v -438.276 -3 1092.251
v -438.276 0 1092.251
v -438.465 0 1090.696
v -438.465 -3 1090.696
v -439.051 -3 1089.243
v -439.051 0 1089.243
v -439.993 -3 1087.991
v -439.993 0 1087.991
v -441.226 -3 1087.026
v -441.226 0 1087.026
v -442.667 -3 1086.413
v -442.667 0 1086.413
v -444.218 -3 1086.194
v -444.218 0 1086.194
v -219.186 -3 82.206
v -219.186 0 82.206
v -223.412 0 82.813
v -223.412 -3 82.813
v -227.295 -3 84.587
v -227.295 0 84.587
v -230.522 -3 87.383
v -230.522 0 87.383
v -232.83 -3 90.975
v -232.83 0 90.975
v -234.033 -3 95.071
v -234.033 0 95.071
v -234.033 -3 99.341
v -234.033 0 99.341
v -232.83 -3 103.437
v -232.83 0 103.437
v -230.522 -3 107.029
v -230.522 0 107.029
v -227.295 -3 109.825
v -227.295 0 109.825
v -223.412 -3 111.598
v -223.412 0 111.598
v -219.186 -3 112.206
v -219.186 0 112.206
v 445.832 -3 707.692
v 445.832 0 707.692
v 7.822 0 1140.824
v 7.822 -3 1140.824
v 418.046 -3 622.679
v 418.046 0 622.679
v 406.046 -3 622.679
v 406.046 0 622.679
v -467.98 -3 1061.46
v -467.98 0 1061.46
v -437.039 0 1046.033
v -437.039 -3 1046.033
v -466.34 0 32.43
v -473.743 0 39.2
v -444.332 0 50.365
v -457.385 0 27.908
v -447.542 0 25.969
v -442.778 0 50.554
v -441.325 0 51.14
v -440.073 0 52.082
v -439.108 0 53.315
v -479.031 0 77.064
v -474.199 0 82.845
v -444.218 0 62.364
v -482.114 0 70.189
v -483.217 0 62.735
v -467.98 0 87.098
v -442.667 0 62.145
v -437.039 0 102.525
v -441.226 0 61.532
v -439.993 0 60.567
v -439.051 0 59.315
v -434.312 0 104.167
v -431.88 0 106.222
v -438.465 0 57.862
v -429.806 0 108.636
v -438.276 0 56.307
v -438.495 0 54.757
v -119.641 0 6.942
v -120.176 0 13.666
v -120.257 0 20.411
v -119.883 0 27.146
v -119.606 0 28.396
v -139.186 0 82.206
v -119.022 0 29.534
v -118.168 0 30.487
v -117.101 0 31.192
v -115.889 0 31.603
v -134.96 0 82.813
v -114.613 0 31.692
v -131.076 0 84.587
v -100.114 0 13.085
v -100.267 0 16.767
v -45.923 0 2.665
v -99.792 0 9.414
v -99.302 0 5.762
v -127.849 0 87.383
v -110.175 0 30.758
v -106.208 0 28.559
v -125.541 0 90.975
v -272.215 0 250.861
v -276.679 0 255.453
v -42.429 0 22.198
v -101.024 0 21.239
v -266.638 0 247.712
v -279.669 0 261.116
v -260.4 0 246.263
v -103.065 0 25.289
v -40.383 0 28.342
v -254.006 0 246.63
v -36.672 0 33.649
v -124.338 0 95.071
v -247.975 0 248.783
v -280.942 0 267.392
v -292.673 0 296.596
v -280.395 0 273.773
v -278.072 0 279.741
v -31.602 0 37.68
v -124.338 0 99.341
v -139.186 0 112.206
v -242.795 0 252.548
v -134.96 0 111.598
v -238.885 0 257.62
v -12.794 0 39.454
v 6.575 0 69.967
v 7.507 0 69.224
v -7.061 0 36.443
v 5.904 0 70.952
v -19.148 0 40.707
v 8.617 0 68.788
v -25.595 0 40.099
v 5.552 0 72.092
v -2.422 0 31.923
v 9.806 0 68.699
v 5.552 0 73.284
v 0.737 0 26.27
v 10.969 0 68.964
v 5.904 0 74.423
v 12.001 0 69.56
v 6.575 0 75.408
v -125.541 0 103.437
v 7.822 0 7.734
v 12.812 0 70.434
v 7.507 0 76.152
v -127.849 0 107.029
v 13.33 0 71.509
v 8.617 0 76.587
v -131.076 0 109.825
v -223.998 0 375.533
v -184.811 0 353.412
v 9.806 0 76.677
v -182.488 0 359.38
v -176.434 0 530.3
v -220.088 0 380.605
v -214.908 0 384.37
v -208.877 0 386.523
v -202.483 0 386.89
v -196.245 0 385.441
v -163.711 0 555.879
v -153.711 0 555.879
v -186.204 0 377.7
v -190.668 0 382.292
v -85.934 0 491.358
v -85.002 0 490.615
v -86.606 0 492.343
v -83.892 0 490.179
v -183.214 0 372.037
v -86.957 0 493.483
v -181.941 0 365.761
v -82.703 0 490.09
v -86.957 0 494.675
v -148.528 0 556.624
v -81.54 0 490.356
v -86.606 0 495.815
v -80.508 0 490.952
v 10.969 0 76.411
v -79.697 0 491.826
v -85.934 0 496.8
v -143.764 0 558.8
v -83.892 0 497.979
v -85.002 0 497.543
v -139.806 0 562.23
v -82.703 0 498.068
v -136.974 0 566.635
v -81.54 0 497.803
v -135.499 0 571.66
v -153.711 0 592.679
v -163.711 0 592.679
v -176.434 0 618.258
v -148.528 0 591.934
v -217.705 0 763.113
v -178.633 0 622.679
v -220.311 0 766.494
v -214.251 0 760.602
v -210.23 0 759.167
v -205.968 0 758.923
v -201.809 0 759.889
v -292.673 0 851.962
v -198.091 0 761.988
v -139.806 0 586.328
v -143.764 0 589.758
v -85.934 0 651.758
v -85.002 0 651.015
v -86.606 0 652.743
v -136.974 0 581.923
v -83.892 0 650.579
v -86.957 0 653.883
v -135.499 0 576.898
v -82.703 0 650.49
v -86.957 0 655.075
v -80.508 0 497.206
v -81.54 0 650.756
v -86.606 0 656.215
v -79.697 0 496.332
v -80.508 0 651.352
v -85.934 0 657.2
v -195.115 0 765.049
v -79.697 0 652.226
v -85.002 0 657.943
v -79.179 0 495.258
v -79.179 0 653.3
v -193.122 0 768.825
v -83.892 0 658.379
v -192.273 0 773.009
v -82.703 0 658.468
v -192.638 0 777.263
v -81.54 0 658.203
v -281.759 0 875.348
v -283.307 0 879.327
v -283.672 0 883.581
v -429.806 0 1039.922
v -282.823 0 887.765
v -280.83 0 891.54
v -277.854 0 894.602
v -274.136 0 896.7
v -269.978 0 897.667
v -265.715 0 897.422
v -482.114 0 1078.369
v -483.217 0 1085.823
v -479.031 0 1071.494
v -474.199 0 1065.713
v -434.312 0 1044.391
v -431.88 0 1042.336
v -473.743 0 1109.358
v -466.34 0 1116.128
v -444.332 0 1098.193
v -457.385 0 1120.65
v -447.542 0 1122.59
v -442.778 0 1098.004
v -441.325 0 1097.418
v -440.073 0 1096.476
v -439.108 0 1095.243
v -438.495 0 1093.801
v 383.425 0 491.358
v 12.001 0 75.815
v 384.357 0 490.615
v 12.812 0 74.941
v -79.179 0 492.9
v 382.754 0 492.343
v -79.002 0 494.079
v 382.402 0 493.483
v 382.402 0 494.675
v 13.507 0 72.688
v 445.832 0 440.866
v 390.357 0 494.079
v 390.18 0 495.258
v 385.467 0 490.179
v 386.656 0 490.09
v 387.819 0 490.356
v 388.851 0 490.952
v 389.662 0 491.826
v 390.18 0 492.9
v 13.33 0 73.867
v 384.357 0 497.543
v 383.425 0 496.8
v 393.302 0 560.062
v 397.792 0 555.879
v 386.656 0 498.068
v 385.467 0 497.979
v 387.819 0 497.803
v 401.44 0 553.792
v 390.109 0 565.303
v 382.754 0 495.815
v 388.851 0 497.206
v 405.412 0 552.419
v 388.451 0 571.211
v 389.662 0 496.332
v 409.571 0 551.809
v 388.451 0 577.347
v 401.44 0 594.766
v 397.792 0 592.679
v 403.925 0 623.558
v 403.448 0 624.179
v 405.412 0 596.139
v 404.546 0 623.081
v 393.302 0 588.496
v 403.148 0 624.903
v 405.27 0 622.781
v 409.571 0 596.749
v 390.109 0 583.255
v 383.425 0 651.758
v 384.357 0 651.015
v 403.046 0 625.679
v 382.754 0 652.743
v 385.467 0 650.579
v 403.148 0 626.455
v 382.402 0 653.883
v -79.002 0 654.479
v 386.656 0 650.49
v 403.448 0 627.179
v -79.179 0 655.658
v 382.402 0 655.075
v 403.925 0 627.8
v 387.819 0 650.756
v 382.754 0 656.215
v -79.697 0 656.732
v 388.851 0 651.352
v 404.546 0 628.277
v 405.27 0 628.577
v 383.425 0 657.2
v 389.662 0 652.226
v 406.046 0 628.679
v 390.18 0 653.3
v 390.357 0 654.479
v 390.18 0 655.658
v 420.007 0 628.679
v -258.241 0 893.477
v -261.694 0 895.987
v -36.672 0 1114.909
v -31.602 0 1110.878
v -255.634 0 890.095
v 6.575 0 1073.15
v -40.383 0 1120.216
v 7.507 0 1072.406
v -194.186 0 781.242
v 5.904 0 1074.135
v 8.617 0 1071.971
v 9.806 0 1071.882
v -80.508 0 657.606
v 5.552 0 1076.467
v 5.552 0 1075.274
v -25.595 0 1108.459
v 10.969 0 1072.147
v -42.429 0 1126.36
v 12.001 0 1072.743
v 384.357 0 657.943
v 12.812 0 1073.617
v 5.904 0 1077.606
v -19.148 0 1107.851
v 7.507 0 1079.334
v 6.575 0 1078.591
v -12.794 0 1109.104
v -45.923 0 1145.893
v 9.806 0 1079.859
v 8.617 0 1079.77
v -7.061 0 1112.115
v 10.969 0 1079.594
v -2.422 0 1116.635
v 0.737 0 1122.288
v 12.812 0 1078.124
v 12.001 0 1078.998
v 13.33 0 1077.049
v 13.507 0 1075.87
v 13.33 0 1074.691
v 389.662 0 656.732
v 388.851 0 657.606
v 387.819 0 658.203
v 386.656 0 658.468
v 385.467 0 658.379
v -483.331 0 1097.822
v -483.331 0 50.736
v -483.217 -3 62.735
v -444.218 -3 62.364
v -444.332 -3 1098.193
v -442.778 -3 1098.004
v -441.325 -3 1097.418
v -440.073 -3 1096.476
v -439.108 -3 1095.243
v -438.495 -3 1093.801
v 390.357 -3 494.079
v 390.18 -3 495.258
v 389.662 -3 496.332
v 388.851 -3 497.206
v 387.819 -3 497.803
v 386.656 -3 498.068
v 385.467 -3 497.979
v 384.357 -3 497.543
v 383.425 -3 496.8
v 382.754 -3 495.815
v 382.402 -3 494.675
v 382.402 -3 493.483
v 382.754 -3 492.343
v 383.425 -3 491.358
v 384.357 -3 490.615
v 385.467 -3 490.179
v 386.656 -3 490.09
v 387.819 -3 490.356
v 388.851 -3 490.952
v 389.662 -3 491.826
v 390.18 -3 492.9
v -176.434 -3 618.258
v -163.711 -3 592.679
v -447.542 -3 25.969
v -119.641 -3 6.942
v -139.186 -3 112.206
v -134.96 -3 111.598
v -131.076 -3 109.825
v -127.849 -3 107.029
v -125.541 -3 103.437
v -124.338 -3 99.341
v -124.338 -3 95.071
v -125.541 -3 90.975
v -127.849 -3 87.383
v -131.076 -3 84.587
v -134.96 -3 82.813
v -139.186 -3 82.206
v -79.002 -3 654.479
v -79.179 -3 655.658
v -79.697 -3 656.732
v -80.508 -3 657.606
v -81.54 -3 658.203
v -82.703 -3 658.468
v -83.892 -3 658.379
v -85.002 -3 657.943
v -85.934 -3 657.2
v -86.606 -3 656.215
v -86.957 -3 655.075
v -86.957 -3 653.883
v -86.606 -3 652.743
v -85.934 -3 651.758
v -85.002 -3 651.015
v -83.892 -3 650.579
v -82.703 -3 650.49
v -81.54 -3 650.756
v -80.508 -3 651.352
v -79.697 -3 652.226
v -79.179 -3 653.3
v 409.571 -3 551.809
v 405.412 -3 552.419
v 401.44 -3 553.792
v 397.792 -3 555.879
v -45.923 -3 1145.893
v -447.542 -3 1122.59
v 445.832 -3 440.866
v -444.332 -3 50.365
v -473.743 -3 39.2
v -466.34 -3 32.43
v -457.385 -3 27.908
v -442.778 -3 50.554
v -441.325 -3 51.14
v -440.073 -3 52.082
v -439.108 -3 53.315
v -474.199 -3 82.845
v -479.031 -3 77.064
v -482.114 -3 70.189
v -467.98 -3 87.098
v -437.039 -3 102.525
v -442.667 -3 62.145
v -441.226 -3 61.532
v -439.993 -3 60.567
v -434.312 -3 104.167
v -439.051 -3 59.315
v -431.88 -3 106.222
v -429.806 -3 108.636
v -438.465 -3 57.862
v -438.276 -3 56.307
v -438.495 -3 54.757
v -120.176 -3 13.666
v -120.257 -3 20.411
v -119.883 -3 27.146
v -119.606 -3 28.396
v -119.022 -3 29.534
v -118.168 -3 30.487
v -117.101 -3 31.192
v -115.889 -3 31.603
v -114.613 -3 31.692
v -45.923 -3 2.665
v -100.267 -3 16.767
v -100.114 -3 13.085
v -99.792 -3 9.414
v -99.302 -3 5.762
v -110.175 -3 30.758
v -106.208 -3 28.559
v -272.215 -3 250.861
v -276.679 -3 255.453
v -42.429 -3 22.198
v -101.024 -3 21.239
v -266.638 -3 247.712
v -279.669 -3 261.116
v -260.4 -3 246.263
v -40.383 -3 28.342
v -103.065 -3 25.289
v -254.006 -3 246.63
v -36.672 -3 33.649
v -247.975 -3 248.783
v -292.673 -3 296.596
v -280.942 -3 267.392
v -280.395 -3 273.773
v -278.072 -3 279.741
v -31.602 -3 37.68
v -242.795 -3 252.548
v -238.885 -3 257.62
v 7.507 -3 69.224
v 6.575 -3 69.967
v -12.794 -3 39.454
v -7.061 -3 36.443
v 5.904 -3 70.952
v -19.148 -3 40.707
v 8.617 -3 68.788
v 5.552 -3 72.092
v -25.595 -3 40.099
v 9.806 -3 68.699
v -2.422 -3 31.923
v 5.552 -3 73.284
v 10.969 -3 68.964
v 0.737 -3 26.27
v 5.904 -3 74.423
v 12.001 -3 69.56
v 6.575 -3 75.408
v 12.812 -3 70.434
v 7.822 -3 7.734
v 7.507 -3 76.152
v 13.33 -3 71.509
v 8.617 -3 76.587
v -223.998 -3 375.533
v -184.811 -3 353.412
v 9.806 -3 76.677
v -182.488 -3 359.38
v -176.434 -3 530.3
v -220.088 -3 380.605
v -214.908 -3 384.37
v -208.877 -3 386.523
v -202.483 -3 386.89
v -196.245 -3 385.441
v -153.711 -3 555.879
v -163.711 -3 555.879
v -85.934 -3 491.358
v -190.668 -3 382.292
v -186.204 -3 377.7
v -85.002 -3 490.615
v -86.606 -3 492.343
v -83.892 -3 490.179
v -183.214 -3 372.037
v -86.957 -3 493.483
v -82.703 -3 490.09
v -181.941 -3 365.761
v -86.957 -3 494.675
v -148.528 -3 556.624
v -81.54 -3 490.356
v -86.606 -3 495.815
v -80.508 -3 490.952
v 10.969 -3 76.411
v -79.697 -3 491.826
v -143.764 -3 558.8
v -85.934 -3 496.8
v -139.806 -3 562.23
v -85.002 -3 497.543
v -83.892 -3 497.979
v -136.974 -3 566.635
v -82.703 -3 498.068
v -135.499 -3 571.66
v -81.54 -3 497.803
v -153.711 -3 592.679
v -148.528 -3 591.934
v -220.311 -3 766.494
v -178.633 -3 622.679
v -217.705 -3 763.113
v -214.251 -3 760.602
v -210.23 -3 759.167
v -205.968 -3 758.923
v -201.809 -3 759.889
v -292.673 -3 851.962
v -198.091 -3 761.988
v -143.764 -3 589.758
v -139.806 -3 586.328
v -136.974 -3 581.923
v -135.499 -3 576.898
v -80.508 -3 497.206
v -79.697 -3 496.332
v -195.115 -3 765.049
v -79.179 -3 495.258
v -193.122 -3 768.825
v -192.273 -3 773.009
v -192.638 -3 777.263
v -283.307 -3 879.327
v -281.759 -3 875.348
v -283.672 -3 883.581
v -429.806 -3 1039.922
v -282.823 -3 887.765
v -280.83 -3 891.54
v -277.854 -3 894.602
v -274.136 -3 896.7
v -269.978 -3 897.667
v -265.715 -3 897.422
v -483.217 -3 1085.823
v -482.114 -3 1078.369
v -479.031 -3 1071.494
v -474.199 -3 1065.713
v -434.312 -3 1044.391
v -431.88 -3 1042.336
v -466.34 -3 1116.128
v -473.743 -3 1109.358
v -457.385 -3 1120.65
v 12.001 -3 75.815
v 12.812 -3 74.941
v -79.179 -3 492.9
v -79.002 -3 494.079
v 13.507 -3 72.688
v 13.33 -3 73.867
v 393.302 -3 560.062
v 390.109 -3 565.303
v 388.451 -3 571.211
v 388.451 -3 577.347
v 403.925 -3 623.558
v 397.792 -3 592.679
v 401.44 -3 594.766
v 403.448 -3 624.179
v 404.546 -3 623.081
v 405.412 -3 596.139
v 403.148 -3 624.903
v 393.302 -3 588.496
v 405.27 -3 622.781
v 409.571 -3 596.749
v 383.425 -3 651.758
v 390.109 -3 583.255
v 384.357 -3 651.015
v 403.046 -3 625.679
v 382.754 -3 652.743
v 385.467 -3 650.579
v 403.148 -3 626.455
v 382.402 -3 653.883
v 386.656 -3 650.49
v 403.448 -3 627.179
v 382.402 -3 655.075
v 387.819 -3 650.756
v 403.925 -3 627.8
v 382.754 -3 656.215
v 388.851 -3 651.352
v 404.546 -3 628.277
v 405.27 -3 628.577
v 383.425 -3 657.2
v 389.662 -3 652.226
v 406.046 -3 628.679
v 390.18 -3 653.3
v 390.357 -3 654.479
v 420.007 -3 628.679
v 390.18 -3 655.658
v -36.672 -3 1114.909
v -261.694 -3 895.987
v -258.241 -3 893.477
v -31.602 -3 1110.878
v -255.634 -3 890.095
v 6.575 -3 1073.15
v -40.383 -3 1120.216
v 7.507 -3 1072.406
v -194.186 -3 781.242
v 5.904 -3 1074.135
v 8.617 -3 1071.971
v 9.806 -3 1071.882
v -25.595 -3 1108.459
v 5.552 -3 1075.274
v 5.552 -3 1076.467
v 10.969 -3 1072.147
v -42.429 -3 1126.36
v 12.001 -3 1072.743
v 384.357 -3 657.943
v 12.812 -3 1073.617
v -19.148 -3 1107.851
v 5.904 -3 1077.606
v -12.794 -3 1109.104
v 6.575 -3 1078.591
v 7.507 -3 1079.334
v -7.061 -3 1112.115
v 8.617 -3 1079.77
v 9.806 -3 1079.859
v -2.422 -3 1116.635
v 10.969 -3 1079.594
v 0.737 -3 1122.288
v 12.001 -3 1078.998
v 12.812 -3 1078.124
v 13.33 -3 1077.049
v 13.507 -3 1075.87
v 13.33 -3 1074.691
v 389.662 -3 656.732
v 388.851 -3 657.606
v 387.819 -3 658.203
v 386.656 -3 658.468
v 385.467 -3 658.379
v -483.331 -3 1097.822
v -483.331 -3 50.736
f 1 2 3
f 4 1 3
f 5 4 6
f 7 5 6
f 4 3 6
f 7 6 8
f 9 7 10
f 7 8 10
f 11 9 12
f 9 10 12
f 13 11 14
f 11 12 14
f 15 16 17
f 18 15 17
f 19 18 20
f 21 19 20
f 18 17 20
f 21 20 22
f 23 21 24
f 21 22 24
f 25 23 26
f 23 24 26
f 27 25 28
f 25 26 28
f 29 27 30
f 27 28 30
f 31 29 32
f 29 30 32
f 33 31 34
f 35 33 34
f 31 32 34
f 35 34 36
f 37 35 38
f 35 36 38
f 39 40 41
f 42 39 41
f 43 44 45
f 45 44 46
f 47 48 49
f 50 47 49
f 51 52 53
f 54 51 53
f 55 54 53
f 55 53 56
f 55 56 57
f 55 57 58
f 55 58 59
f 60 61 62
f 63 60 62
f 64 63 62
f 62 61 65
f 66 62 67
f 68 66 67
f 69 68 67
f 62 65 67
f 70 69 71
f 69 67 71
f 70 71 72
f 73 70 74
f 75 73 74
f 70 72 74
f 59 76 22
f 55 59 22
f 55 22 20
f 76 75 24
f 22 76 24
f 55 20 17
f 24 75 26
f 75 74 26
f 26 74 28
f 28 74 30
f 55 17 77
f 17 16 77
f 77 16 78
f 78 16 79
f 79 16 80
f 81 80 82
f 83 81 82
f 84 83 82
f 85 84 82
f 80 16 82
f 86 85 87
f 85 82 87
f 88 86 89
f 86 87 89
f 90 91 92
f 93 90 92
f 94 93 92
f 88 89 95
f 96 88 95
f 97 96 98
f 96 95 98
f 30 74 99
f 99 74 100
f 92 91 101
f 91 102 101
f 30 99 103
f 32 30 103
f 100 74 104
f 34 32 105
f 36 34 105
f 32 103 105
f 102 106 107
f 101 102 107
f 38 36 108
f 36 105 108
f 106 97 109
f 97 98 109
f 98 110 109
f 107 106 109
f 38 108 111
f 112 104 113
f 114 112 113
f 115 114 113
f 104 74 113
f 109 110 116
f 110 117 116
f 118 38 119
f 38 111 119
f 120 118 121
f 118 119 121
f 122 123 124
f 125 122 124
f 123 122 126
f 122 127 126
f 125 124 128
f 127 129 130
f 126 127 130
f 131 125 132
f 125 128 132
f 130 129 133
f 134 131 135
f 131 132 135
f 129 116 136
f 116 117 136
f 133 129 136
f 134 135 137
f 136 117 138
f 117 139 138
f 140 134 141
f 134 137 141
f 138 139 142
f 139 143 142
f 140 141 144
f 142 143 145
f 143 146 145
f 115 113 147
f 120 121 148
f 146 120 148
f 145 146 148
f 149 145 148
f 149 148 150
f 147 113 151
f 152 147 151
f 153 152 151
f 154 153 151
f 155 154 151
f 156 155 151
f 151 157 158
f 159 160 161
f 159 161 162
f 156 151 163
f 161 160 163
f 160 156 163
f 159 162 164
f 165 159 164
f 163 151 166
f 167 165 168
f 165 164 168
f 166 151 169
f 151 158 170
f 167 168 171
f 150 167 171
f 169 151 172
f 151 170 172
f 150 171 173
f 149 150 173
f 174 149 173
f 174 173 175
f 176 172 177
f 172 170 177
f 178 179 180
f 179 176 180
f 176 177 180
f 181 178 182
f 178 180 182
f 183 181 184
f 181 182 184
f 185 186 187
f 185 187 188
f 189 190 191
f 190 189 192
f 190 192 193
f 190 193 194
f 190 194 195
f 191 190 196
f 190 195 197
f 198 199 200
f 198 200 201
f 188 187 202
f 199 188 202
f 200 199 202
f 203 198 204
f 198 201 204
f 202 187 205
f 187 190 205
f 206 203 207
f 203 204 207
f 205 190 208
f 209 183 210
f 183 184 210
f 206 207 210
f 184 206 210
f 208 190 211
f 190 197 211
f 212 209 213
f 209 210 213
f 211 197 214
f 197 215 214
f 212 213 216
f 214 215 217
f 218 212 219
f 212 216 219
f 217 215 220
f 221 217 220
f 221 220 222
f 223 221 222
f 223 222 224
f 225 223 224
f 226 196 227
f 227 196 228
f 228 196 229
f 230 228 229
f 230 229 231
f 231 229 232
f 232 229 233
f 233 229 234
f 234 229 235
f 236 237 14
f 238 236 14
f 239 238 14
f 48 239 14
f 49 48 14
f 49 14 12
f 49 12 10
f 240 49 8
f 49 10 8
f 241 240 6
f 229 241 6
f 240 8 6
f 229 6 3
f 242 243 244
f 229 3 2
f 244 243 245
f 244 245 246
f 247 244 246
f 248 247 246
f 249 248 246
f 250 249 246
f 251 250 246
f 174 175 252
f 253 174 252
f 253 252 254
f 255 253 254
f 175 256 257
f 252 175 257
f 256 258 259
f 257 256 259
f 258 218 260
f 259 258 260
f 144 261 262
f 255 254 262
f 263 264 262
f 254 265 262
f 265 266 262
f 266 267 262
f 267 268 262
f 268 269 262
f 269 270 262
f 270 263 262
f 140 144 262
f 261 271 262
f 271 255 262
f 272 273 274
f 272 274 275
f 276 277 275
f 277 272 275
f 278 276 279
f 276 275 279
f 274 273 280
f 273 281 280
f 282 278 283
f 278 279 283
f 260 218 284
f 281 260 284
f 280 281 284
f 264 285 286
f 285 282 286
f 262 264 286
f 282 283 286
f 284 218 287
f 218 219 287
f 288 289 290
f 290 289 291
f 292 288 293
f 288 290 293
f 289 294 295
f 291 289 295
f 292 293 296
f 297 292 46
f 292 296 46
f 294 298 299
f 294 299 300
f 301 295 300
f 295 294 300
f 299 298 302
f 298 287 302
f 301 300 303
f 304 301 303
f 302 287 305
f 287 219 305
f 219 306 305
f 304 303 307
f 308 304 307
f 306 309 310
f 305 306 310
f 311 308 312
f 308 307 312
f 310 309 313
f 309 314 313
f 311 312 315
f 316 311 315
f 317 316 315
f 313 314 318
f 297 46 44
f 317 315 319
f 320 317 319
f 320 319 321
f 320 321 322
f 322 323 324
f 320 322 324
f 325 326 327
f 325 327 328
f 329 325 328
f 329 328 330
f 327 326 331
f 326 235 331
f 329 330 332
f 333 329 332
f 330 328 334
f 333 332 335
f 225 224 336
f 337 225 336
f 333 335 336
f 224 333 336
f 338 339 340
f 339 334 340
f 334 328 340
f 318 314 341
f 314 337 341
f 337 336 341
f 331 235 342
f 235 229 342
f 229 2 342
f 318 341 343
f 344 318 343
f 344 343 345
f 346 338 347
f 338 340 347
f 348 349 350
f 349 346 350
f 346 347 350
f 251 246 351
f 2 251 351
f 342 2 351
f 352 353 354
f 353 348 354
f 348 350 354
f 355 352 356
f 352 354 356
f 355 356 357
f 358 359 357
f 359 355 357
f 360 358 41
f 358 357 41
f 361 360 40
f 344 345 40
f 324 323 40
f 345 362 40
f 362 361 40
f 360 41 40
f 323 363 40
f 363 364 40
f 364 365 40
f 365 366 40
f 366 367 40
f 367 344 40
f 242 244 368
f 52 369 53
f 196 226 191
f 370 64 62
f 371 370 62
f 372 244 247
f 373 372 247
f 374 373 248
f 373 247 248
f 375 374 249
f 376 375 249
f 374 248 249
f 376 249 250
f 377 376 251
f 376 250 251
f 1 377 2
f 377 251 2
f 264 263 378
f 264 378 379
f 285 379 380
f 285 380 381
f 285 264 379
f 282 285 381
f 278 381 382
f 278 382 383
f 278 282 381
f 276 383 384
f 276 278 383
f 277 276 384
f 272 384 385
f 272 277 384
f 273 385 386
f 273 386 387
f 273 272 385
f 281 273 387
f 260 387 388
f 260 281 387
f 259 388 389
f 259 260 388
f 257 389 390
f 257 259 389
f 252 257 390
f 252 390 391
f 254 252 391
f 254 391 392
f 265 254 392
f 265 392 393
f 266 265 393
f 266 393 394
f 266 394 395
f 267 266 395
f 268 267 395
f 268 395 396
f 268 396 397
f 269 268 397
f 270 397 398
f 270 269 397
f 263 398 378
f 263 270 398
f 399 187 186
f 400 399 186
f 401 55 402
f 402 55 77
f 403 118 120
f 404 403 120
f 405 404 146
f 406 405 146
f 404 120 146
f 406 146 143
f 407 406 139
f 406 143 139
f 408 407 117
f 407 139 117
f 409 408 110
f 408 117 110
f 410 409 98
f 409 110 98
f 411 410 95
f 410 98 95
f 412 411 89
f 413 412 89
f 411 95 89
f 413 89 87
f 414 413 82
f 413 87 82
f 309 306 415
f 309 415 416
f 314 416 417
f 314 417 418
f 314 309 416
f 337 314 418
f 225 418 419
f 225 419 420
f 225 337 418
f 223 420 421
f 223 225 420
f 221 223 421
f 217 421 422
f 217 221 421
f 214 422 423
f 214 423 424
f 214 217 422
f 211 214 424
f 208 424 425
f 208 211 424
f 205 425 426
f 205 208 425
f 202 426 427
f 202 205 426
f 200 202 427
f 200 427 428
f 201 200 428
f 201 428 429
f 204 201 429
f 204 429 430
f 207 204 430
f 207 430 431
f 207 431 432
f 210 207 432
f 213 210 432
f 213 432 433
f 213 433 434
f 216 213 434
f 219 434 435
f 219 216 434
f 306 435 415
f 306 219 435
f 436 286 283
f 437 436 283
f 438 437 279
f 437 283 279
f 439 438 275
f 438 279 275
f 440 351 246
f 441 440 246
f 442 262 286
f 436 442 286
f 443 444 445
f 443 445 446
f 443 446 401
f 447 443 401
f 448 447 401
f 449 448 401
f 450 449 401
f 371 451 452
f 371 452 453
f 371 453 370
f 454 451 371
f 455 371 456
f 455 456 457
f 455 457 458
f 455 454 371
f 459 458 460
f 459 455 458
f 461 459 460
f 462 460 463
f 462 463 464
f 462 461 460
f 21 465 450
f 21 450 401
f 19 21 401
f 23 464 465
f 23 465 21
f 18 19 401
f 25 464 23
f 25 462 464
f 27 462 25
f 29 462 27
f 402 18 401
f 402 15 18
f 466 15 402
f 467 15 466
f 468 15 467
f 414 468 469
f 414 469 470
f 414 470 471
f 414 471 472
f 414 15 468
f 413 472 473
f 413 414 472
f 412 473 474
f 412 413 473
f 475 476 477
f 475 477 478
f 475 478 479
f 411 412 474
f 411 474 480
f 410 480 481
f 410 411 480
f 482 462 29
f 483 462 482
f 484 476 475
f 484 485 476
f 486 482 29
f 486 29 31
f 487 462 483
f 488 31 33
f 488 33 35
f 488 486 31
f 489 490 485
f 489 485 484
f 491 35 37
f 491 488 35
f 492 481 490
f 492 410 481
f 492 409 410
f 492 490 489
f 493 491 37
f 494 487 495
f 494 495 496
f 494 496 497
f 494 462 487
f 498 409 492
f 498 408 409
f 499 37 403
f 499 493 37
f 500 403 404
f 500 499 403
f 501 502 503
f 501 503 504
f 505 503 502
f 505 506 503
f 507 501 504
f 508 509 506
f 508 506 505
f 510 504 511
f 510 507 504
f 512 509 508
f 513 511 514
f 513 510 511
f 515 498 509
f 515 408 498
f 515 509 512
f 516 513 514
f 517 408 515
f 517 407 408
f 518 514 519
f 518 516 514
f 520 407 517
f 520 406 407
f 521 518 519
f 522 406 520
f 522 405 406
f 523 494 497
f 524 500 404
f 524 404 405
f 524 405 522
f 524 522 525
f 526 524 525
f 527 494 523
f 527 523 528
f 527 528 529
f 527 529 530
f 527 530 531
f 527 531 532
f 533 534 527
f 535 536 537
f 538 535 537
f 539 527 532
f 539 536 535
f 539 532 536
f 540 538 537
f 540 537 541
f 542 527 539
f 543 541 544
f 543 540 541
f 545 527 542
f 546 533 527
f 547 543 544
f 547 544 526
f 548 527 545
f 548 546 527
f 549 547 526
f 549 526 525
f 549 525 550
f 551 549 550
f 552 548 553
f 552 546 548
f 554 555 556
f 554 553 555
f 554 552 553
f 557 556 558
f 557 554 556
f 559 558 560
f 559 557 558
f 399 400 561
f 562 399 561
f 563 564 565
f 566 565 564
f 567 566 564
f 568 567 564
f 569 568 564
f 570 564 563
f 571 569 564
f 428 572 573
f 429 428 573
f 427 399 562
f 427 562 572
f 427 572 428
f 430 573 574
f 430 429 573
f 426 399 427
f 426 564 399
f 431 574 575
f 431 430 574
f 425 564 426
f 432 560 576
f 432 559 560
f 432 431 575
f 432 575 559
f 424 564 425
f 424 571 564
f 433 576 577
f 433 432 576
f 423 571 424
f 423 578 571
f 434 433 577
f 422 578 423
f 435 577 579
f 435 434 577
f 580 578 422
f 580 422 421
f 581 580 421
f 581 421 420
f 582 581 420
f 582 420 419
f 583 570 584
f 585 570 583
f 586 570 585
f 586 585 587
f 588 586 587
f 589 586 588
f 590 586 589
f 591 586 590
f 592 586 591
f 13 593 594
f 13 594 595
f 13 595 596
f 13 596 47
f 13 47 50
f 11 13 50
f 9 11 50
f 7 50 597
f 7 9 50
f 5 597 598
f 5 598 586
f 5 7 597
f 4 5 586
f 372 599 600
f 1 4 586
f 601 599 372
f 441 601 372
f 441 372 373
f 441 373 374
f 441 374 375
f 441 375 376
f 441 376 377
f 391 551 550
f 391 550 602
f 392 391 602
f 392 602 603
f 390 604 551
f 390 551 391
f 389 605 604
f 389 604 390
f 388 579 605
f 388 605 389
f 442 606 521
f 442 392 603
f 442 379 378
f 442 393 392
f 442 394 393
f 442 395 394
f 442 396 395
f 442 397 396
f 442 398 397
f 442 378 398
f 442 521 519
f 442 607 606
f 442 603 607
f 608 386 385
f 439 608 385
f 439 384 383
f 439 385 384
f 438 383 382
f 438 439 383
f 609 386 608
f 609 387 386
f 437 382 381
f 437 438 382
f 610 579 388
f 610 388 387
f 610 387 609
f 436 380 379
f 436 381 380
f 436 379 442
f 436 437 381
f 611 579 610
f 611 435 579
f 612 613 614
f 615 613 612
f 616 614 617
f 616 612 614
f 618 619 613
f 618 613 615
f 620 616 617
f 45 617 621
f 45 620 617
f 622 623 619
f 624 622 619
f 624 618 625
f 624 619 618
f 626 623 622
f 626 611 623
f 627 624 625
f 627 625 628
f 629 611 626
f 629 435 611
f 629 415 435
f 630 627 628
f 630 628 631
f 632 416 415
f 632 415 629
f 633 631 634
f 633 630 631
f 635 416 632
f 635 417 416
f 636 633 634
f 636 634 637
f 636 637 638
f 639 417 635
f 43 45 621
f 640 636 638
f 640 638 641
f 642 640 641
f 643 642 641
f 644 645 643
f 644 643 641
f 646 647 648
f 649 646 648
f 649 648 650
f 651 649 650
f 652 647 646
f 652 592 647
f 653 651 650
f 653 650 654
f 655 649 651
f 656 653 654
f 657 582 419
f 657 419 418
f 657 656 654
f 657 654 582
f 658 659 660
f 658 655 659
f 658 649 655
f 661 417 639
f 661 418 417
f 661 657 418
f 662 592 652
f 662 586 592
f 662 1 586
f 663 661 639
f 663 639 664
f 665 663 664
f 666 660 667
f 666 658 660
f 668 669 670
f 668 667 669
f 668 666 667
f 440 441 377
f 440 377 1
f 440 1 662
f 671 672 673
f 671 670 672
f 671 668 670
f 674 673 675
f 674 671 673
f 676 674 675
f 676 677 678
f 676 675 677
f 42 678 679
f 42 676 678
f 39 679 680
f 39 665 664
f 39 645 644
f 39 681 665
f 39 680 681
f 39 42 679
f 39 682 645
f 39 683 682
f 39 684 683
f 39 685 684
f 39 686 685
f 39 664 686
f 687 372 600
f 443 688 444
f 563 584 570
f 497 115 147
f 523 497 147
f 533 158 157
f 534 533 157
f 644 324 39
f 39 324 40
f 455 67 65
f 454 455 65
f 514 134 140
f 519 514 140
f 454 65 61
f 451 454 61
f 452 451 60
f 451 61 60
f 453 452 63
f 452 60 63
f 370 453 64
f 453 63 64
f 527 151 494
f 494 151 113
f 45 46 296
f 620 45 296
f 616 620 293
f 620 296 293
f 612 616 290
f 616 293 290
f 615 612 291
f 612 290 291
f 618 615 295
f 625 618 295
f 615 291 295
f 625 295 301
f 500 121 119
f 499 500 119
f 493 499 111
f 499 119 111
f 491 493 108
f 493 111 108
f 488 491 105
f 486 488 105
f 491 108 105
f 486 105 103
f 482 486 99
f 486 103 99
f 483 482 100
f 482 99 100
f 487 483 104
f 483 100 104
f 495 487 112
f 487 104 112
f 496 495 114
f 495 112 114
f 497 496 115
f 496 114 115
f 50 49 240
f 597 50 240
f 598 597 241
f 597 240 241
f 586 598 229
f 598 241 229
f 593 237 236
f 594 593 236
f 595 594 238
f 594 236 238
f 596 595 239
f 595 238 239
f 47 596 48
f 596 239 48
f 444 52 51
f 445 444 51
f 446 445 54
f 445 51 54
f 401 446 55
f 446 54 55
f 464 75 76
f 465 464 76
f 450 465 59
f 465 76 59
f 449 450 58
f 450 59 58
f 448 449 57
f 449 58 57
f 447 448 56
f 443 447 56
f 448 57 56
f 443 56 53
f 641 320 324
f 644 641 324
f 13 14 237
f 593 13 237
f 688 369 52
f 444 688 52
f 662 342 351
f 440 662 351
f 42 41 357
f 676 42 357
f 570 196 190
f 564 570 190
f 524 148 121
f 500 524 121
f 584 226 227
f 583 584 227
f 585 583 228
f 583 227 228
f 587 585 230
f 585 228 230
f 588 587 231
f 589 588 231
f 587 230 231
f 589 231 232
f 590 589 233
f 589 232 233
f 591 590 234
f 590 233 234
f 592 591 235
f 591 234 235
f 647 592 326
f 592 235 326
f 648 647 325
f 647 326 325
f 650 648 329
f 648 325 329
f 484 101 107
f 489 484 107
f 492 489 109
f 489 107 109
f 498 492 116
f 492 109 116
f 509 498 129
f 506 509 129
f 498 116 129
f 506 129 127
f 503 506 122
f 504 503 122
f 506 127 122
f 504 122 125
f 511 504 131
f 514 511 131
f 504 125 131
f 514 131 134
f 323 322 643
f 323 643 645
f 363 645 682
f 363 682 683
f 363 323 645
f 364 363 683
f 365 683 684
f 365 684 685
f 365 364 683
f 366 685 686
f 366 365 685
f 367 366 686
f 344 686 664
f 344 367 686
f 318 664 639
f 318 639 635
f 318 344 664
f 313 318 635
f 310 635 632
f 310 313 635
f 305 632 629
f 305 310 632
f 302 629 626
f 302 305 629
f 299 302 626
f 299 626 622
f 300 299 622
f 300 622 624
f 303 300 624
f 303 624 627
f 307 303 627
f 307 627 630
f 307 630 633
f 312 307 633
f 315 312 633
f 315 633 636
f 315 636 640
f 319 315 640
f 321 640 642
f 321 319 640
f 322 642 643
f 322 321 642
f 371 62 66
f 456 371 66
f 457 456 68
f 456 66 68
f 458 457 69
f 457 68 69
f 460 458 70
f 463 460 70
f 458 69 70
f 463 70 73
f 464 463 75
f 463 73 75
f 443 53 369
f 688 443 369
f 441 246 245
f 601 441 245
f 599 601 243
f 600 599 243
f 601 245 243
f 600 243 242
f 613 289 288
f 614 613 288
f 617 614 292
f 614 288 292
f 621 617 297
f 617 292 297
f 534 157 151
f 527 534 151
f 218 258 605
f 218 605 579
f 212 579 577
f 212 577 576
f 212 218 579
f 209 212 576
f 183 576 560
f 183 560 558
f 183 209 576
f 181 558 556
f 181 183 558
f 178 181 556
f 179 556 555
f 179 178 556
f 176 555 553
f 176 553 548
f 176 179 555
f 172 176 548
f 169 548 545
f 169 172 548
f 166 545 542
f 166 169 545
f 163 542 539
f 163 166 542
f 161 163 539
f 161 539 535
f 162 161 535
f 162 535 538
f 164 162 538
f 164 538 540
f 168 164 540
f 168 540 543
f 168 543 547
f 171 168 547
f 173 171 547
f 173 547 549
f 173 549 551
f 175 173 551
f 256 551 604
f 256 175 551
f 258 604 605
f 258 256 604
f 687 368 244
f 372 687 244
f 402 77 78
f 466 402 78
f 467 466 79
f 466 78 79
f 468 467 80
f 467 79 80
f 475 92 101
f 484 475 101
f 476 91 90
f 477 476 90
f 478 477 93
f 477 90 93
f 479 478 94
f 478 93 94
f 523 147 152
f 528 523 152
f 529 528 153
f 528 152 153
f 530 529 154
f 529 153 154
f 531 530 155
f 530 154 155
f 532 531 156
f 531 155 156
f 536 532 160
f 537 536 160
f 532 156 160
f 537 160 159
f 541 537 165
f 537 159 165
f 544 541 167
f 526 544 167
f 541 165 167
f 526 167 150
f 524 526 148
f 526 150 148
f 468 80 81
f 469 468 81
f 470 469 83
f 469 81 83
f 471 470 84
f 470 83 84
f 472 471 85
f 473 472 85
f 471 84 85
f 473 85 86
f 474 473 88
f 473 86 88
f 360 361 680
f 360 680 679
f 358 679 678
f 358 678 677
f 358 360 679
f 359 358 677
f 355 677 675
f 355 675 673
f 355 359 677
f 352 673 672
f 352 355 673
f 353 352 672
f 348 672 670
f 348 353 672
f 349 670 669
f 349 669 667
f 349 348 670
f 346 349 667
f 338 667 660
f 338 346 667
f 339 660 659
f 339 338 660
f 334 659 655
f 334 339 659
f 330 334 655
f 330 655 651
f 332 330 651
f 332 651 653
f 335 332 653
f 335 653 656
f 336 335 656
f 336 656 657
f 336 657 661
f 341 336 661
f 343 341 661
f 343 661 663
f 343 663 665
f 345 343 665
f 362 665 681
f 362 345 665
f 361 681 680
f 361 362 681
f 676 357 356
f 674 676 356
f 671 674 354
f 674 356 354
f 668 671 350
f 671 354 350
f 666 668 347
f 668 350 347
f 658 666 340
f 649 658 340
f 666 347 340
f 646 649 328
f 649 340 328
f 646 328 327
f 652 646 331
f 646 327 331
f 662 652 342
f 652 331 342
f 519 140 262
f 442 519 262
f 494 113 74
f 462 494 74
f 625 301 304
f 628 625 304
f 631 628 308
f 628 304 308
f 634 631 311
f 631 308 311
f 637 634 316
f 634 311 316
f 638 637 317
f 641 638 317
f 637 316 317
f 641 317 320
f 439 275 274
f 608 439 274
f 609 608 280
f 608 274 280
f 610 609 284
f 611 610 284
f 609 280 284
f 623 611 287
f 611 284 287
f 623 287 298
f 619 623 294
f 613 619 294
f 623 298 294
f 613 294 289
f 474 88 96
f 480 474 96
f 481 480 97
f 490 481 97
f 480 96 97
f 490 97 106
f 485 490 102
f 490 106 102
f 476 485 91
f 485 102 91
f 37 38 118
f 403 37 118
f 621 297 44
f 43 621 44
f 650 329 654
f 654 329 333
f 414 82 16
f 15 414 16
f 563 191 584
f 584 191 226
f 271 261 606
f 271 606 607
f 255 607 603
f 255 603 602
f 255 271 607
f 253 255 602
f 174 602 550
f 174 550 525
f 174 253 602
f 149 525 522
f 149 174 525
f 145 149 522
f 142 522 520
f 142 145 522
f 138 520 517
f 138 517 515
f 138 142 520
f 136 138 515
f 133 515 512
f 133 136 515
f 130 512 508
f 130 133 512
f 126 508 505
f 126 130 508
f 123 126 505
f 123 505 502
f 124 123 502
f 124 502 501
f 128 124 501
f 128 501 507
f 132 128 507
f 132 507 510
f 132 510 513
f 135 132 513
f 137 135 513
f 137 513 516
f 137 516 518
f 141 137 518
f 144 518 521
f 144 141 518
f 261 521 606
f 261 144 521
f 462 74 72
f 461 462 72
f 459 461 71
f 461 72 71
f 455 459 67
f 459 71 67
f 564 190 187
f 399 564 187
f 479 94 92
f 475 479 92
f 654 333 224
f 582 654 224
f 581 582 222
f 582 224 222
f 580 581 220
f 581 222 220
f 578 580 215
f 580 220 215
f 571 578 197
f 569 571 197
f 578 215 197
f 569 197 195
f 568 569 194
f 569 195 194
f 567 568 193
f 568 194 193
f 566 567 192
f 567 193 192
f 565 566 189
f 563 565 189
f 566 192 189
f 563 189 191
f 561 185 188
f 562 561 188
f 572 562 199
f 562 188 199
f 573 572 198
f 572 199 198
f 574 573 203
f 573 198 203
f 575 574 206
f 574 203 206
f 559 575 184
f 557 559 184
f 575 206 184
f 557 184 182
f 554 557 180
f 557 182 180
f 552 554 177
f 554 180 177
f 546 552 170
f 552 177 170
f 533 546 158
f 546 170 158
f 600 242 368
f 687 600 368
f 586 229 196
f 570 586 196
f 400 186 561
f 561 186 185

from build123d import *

# Parameters (mm, degrees)
F0_R     = 4
F1_DEPTH = 3


with BuildPart() as f1:
    # F0 (on Front) → F1 (new body)
    with BuildSketch(Plane.XZ):
        with BuildLine():
            ThreePointArc((-42.428788, 22.197763), (-22.393428, 40.636528), (0.736568, 26.269656))
            Line((0.736568, 26.269656), (7.82161, 7.734496))
            Line((7.82161, 7.734496), (445.831745, 440.866256))
            Line((445.831745, 440.866256), (409.571118, 551.809463))
            ThreePointArc((409.571118, 551.809463), (403.393924, 553.012383), (397.791506, 555.879027))
            Line((397.791506, 555.879027), (-153.711431, 555.879027))
            Line((-153.711431, 555.879027), (-163.711431, 555.879027))
            Line((-163.711431, 555.879027), (-176.433934, 530.299822))
            Line((-176.433934, 530.299822), (-292.672837, 296.595913))
            Line((-292.672837, 296.595913), (-429.805557, 108.635613))
            ThreePointArc((-429.805557, 108.635613), (-433.055197, 105.145969), (-437.038546, 102.524765))
            Line((-437.038546, 102.524765), (-467.979575, 87.098137))
            ThreePointArc((-467.979575, 87.098137), (-479.031049, 77.063624), (-483.216559, 62.73505))
            Line((-483.216559, 62.73505), (-444.218322, 62.364245))
            ThreePointArc((-444.218322, 62.364245), (-439.992581, 60.566627), (-438.27564, 56.307469))
            ThreePointArc((-438.27564, 56.307469), (-440.073258, 52.081729), (-444.332415, 50.364787))
            Line((-444.332415, 50.364787), (-483.330653, 50.735592))
            Line((-483.330653, 50.735592), (-473.742625, 39.200006))
            ThreePointArc((-473.742625, 39.200006), (-462.016917, 29.862605), (-447.542263, 25.968544))
            Line((-447.542263, 25.968544), (-119.640526, 6.942116))
            ThreePointArc((-119.640526, 6.942116), (-120.273154, 17.038104), (-119.882564, 27.146349))
            ThreePointArc((-119.882564, 27.146349), (-118.168468, 30.486744), (-114.612815, 31.692435))
            Line((-114.612815, 31.692435), (-99.287074, 30.803162))
            ThreePointArc((-99.287074, 30.803162), (-100.086144, 23.806602), (-100.266839, 16.766878))
            ThreePointArc((-100.266839, 16.766878), (-99.974524, 11.247746), (-99.30184, 5.761968))
            Line((-99.30184, 5.761968), (-45.922757, 2.664658))
            Line((-45.922757, 2.664658), (-42.428788, 22.197763))
        make_face()
        with BuildLine():
            ThreePointArc((-219.185589, 82.205842), (-234.185589, 97.205842), (-219.185589, 112.205842))
            Line((-219.185589, 112.205842), (-139.185589, 112.205842))
            ThreePointArc((-139.185589, 112.205842), (-124.185589, 97.205842), (-139.185589, 82.205842))
            Line((-139.185589, 82.205842), (-219.185589, 82.205842))
        make_face(mode=Mode.SUBTRACT)
        with BuildLine():
            ThreePointArc((-238.884885, 257.620199), (-269.539195, 249.087128), (-278.072266, 279.741438))
            Line((-278.072266, 279.741438), (-223.998126, 375.532812))
            ThreePointArc((-223.998126, 375.532812), (-193.343817, 384.065883), (-184.810746, 353.411573))
            Line((-184.810746, 353.411573), (-238.884885, 257.620199))
        make_face(mode=Mode.SUBTRACT)
        with Locations((-83.001788, 494.079027)):
            Circle(F0_R, mode=Mode.SUBTRACT)
        with Locations((9.507399, 72.687717)):
            Circle(F0_R, mode=Mode.SUBTRACT)
        with Locations((386.357424, 494.079027)):
            Circle(F0_R, mode=Mode.SUBTRACT)
        with BuildLine():
            ThreePointArc((-114.612815, 31.692435), (-104.514185, 27.041692), (-100.266839, 16.766878))
            ThreePointArc((-100.266839, 16.766878), (-100.086144, 23.806602), (-99.287074, 30.803162))
            Line((-99.287074, 30.803162), (-114.612815, 31.692435))
        make_face()
        with BuildLine():
            Line((-153.711431, 555.879027), (397.791506, 555.879027))
            ThreePointArc((397.791506, 555.879027), (388.241023, 574.279027), (397.791506, 592.679027))
            Line((397.791506, 592.679027), (-153.711431, 592.679027))
            ThreePointArc((-153.711431, 592.679027), (-135.311431, 574.279027), (-153.711431, 555.879027))
        make_face()
        with BuildLine():
            Line((-153.711431, 592.679027), (397.791506, 592.679027))
            ThreePointArc((397.791506, 592.679027), (403.393924, 595.545671), (409.571118, 596.748591))
            Line((409.571118, 596.748591), (418.046209, 622.679027))
            Line((418.046209, 622.679027), (406.046209, 622.679027))
            ThreePointArc((406.046209, 622.679027), (403.924889, 623.557707), (403.046209, 625.679027))
            ThreePointArc((403.046209, 625.679027), (403.924889, 627.800347), (406.046209, 628.679027))
            Line((406.046209, 628.679027), (420.007247, 628.679027))
            Line((420.007247, 628.679027), (445.831745, 707.691799))
            Line((445.831745, 707.691799), (7.82161, 1140.823559))
            Line((7.82161, 1140.823559), (0.736568, 1122.288398))
            ThreePointArc((0.736568, 1122.288398), (-22.393428, 1107.921526), (-42.428788, 1126.360291))
            Line((-42.428788, 1126.360291), (-45.922757, 1145.893396))
            Line((-45.922757, 1145.893396), (-447.542263, 1122.58951))
            ThreePointArc((-447.542263, 1122.58951), (-462.016917, 1118.695449), (-473.742625, 1109.358048))
            Line((-473.742625, 1109.358048), (-483.330653, 1097.822462))
            Line((-483.330653, 1097.822462), (-444.332415, 1098.193267))
            ThreePointArc((-444.332415, 1098.193267), (-440.073258, 1096.476326), (-438.27564, 1092.250585))
            ThreePointArc((-438.27564, 1092.250585), (-439.992581, 1087.991428), (-444.218322, 1086.19381))
            Line((-444.218322, 1086.19381), (-483.216559, 1085.823005))
            ThreePointArc((-483.216559, 1085.823005), (-479.031049, 1071.494431), (-467.979575, 1061.459917))
            Line((-467.979575, 1061.459917), (-437.038546, 1046.033289))
            ThreePointArc((-437.038546, 1046.033289), (-433.055197, 1043.412085), (-429.805557, 1039.922441))
            Line((-429.805557, 1039.922441), (-292.672837, 851.962142))
            Line((-292.672837, 851.962142), (-178.632735, 622.679027))
            Line((-178.632735, 622.679027), (-176.433934, 618.258232))
            Line((-176.433934, 618.258232), (-163.711431, 592.679027))
            Line((-163.711431, 592.679027), (-153.711431, 592.679027))
        make_face()
        with Locations((-83.001788, 654.479027)):
            Circle(F0_R, mode=Mode.SUBTRACT)
        with BuildLine():
            ThreePointArc((-281.759139, 875.347847), (-276.070425, 895.784053), (-255.634219, 890.095339))
            Line((-255.634219, 890.095339), (-194.186333, 781.241505))
            ThreePointArc((-194.186333, 781.241505), (-199.875047, 760.805298), (-220.311253, 766.494012))
            Line((-220.311253, 766.494012), (-281.759139, 875.347847))
        make_face(mode=Mode.SUBTRACT)
        with Locations((386.357424, 654.479027)):
            Circle(F0_R, mode=Mode.SUBTRACT)
        with Locations((9.507399, 1075.870338)):
            Circle(F0_R, mode=Mode.SUBTRACT)
    extrude(amount=F1_DEPTH)


solid = f1.part
